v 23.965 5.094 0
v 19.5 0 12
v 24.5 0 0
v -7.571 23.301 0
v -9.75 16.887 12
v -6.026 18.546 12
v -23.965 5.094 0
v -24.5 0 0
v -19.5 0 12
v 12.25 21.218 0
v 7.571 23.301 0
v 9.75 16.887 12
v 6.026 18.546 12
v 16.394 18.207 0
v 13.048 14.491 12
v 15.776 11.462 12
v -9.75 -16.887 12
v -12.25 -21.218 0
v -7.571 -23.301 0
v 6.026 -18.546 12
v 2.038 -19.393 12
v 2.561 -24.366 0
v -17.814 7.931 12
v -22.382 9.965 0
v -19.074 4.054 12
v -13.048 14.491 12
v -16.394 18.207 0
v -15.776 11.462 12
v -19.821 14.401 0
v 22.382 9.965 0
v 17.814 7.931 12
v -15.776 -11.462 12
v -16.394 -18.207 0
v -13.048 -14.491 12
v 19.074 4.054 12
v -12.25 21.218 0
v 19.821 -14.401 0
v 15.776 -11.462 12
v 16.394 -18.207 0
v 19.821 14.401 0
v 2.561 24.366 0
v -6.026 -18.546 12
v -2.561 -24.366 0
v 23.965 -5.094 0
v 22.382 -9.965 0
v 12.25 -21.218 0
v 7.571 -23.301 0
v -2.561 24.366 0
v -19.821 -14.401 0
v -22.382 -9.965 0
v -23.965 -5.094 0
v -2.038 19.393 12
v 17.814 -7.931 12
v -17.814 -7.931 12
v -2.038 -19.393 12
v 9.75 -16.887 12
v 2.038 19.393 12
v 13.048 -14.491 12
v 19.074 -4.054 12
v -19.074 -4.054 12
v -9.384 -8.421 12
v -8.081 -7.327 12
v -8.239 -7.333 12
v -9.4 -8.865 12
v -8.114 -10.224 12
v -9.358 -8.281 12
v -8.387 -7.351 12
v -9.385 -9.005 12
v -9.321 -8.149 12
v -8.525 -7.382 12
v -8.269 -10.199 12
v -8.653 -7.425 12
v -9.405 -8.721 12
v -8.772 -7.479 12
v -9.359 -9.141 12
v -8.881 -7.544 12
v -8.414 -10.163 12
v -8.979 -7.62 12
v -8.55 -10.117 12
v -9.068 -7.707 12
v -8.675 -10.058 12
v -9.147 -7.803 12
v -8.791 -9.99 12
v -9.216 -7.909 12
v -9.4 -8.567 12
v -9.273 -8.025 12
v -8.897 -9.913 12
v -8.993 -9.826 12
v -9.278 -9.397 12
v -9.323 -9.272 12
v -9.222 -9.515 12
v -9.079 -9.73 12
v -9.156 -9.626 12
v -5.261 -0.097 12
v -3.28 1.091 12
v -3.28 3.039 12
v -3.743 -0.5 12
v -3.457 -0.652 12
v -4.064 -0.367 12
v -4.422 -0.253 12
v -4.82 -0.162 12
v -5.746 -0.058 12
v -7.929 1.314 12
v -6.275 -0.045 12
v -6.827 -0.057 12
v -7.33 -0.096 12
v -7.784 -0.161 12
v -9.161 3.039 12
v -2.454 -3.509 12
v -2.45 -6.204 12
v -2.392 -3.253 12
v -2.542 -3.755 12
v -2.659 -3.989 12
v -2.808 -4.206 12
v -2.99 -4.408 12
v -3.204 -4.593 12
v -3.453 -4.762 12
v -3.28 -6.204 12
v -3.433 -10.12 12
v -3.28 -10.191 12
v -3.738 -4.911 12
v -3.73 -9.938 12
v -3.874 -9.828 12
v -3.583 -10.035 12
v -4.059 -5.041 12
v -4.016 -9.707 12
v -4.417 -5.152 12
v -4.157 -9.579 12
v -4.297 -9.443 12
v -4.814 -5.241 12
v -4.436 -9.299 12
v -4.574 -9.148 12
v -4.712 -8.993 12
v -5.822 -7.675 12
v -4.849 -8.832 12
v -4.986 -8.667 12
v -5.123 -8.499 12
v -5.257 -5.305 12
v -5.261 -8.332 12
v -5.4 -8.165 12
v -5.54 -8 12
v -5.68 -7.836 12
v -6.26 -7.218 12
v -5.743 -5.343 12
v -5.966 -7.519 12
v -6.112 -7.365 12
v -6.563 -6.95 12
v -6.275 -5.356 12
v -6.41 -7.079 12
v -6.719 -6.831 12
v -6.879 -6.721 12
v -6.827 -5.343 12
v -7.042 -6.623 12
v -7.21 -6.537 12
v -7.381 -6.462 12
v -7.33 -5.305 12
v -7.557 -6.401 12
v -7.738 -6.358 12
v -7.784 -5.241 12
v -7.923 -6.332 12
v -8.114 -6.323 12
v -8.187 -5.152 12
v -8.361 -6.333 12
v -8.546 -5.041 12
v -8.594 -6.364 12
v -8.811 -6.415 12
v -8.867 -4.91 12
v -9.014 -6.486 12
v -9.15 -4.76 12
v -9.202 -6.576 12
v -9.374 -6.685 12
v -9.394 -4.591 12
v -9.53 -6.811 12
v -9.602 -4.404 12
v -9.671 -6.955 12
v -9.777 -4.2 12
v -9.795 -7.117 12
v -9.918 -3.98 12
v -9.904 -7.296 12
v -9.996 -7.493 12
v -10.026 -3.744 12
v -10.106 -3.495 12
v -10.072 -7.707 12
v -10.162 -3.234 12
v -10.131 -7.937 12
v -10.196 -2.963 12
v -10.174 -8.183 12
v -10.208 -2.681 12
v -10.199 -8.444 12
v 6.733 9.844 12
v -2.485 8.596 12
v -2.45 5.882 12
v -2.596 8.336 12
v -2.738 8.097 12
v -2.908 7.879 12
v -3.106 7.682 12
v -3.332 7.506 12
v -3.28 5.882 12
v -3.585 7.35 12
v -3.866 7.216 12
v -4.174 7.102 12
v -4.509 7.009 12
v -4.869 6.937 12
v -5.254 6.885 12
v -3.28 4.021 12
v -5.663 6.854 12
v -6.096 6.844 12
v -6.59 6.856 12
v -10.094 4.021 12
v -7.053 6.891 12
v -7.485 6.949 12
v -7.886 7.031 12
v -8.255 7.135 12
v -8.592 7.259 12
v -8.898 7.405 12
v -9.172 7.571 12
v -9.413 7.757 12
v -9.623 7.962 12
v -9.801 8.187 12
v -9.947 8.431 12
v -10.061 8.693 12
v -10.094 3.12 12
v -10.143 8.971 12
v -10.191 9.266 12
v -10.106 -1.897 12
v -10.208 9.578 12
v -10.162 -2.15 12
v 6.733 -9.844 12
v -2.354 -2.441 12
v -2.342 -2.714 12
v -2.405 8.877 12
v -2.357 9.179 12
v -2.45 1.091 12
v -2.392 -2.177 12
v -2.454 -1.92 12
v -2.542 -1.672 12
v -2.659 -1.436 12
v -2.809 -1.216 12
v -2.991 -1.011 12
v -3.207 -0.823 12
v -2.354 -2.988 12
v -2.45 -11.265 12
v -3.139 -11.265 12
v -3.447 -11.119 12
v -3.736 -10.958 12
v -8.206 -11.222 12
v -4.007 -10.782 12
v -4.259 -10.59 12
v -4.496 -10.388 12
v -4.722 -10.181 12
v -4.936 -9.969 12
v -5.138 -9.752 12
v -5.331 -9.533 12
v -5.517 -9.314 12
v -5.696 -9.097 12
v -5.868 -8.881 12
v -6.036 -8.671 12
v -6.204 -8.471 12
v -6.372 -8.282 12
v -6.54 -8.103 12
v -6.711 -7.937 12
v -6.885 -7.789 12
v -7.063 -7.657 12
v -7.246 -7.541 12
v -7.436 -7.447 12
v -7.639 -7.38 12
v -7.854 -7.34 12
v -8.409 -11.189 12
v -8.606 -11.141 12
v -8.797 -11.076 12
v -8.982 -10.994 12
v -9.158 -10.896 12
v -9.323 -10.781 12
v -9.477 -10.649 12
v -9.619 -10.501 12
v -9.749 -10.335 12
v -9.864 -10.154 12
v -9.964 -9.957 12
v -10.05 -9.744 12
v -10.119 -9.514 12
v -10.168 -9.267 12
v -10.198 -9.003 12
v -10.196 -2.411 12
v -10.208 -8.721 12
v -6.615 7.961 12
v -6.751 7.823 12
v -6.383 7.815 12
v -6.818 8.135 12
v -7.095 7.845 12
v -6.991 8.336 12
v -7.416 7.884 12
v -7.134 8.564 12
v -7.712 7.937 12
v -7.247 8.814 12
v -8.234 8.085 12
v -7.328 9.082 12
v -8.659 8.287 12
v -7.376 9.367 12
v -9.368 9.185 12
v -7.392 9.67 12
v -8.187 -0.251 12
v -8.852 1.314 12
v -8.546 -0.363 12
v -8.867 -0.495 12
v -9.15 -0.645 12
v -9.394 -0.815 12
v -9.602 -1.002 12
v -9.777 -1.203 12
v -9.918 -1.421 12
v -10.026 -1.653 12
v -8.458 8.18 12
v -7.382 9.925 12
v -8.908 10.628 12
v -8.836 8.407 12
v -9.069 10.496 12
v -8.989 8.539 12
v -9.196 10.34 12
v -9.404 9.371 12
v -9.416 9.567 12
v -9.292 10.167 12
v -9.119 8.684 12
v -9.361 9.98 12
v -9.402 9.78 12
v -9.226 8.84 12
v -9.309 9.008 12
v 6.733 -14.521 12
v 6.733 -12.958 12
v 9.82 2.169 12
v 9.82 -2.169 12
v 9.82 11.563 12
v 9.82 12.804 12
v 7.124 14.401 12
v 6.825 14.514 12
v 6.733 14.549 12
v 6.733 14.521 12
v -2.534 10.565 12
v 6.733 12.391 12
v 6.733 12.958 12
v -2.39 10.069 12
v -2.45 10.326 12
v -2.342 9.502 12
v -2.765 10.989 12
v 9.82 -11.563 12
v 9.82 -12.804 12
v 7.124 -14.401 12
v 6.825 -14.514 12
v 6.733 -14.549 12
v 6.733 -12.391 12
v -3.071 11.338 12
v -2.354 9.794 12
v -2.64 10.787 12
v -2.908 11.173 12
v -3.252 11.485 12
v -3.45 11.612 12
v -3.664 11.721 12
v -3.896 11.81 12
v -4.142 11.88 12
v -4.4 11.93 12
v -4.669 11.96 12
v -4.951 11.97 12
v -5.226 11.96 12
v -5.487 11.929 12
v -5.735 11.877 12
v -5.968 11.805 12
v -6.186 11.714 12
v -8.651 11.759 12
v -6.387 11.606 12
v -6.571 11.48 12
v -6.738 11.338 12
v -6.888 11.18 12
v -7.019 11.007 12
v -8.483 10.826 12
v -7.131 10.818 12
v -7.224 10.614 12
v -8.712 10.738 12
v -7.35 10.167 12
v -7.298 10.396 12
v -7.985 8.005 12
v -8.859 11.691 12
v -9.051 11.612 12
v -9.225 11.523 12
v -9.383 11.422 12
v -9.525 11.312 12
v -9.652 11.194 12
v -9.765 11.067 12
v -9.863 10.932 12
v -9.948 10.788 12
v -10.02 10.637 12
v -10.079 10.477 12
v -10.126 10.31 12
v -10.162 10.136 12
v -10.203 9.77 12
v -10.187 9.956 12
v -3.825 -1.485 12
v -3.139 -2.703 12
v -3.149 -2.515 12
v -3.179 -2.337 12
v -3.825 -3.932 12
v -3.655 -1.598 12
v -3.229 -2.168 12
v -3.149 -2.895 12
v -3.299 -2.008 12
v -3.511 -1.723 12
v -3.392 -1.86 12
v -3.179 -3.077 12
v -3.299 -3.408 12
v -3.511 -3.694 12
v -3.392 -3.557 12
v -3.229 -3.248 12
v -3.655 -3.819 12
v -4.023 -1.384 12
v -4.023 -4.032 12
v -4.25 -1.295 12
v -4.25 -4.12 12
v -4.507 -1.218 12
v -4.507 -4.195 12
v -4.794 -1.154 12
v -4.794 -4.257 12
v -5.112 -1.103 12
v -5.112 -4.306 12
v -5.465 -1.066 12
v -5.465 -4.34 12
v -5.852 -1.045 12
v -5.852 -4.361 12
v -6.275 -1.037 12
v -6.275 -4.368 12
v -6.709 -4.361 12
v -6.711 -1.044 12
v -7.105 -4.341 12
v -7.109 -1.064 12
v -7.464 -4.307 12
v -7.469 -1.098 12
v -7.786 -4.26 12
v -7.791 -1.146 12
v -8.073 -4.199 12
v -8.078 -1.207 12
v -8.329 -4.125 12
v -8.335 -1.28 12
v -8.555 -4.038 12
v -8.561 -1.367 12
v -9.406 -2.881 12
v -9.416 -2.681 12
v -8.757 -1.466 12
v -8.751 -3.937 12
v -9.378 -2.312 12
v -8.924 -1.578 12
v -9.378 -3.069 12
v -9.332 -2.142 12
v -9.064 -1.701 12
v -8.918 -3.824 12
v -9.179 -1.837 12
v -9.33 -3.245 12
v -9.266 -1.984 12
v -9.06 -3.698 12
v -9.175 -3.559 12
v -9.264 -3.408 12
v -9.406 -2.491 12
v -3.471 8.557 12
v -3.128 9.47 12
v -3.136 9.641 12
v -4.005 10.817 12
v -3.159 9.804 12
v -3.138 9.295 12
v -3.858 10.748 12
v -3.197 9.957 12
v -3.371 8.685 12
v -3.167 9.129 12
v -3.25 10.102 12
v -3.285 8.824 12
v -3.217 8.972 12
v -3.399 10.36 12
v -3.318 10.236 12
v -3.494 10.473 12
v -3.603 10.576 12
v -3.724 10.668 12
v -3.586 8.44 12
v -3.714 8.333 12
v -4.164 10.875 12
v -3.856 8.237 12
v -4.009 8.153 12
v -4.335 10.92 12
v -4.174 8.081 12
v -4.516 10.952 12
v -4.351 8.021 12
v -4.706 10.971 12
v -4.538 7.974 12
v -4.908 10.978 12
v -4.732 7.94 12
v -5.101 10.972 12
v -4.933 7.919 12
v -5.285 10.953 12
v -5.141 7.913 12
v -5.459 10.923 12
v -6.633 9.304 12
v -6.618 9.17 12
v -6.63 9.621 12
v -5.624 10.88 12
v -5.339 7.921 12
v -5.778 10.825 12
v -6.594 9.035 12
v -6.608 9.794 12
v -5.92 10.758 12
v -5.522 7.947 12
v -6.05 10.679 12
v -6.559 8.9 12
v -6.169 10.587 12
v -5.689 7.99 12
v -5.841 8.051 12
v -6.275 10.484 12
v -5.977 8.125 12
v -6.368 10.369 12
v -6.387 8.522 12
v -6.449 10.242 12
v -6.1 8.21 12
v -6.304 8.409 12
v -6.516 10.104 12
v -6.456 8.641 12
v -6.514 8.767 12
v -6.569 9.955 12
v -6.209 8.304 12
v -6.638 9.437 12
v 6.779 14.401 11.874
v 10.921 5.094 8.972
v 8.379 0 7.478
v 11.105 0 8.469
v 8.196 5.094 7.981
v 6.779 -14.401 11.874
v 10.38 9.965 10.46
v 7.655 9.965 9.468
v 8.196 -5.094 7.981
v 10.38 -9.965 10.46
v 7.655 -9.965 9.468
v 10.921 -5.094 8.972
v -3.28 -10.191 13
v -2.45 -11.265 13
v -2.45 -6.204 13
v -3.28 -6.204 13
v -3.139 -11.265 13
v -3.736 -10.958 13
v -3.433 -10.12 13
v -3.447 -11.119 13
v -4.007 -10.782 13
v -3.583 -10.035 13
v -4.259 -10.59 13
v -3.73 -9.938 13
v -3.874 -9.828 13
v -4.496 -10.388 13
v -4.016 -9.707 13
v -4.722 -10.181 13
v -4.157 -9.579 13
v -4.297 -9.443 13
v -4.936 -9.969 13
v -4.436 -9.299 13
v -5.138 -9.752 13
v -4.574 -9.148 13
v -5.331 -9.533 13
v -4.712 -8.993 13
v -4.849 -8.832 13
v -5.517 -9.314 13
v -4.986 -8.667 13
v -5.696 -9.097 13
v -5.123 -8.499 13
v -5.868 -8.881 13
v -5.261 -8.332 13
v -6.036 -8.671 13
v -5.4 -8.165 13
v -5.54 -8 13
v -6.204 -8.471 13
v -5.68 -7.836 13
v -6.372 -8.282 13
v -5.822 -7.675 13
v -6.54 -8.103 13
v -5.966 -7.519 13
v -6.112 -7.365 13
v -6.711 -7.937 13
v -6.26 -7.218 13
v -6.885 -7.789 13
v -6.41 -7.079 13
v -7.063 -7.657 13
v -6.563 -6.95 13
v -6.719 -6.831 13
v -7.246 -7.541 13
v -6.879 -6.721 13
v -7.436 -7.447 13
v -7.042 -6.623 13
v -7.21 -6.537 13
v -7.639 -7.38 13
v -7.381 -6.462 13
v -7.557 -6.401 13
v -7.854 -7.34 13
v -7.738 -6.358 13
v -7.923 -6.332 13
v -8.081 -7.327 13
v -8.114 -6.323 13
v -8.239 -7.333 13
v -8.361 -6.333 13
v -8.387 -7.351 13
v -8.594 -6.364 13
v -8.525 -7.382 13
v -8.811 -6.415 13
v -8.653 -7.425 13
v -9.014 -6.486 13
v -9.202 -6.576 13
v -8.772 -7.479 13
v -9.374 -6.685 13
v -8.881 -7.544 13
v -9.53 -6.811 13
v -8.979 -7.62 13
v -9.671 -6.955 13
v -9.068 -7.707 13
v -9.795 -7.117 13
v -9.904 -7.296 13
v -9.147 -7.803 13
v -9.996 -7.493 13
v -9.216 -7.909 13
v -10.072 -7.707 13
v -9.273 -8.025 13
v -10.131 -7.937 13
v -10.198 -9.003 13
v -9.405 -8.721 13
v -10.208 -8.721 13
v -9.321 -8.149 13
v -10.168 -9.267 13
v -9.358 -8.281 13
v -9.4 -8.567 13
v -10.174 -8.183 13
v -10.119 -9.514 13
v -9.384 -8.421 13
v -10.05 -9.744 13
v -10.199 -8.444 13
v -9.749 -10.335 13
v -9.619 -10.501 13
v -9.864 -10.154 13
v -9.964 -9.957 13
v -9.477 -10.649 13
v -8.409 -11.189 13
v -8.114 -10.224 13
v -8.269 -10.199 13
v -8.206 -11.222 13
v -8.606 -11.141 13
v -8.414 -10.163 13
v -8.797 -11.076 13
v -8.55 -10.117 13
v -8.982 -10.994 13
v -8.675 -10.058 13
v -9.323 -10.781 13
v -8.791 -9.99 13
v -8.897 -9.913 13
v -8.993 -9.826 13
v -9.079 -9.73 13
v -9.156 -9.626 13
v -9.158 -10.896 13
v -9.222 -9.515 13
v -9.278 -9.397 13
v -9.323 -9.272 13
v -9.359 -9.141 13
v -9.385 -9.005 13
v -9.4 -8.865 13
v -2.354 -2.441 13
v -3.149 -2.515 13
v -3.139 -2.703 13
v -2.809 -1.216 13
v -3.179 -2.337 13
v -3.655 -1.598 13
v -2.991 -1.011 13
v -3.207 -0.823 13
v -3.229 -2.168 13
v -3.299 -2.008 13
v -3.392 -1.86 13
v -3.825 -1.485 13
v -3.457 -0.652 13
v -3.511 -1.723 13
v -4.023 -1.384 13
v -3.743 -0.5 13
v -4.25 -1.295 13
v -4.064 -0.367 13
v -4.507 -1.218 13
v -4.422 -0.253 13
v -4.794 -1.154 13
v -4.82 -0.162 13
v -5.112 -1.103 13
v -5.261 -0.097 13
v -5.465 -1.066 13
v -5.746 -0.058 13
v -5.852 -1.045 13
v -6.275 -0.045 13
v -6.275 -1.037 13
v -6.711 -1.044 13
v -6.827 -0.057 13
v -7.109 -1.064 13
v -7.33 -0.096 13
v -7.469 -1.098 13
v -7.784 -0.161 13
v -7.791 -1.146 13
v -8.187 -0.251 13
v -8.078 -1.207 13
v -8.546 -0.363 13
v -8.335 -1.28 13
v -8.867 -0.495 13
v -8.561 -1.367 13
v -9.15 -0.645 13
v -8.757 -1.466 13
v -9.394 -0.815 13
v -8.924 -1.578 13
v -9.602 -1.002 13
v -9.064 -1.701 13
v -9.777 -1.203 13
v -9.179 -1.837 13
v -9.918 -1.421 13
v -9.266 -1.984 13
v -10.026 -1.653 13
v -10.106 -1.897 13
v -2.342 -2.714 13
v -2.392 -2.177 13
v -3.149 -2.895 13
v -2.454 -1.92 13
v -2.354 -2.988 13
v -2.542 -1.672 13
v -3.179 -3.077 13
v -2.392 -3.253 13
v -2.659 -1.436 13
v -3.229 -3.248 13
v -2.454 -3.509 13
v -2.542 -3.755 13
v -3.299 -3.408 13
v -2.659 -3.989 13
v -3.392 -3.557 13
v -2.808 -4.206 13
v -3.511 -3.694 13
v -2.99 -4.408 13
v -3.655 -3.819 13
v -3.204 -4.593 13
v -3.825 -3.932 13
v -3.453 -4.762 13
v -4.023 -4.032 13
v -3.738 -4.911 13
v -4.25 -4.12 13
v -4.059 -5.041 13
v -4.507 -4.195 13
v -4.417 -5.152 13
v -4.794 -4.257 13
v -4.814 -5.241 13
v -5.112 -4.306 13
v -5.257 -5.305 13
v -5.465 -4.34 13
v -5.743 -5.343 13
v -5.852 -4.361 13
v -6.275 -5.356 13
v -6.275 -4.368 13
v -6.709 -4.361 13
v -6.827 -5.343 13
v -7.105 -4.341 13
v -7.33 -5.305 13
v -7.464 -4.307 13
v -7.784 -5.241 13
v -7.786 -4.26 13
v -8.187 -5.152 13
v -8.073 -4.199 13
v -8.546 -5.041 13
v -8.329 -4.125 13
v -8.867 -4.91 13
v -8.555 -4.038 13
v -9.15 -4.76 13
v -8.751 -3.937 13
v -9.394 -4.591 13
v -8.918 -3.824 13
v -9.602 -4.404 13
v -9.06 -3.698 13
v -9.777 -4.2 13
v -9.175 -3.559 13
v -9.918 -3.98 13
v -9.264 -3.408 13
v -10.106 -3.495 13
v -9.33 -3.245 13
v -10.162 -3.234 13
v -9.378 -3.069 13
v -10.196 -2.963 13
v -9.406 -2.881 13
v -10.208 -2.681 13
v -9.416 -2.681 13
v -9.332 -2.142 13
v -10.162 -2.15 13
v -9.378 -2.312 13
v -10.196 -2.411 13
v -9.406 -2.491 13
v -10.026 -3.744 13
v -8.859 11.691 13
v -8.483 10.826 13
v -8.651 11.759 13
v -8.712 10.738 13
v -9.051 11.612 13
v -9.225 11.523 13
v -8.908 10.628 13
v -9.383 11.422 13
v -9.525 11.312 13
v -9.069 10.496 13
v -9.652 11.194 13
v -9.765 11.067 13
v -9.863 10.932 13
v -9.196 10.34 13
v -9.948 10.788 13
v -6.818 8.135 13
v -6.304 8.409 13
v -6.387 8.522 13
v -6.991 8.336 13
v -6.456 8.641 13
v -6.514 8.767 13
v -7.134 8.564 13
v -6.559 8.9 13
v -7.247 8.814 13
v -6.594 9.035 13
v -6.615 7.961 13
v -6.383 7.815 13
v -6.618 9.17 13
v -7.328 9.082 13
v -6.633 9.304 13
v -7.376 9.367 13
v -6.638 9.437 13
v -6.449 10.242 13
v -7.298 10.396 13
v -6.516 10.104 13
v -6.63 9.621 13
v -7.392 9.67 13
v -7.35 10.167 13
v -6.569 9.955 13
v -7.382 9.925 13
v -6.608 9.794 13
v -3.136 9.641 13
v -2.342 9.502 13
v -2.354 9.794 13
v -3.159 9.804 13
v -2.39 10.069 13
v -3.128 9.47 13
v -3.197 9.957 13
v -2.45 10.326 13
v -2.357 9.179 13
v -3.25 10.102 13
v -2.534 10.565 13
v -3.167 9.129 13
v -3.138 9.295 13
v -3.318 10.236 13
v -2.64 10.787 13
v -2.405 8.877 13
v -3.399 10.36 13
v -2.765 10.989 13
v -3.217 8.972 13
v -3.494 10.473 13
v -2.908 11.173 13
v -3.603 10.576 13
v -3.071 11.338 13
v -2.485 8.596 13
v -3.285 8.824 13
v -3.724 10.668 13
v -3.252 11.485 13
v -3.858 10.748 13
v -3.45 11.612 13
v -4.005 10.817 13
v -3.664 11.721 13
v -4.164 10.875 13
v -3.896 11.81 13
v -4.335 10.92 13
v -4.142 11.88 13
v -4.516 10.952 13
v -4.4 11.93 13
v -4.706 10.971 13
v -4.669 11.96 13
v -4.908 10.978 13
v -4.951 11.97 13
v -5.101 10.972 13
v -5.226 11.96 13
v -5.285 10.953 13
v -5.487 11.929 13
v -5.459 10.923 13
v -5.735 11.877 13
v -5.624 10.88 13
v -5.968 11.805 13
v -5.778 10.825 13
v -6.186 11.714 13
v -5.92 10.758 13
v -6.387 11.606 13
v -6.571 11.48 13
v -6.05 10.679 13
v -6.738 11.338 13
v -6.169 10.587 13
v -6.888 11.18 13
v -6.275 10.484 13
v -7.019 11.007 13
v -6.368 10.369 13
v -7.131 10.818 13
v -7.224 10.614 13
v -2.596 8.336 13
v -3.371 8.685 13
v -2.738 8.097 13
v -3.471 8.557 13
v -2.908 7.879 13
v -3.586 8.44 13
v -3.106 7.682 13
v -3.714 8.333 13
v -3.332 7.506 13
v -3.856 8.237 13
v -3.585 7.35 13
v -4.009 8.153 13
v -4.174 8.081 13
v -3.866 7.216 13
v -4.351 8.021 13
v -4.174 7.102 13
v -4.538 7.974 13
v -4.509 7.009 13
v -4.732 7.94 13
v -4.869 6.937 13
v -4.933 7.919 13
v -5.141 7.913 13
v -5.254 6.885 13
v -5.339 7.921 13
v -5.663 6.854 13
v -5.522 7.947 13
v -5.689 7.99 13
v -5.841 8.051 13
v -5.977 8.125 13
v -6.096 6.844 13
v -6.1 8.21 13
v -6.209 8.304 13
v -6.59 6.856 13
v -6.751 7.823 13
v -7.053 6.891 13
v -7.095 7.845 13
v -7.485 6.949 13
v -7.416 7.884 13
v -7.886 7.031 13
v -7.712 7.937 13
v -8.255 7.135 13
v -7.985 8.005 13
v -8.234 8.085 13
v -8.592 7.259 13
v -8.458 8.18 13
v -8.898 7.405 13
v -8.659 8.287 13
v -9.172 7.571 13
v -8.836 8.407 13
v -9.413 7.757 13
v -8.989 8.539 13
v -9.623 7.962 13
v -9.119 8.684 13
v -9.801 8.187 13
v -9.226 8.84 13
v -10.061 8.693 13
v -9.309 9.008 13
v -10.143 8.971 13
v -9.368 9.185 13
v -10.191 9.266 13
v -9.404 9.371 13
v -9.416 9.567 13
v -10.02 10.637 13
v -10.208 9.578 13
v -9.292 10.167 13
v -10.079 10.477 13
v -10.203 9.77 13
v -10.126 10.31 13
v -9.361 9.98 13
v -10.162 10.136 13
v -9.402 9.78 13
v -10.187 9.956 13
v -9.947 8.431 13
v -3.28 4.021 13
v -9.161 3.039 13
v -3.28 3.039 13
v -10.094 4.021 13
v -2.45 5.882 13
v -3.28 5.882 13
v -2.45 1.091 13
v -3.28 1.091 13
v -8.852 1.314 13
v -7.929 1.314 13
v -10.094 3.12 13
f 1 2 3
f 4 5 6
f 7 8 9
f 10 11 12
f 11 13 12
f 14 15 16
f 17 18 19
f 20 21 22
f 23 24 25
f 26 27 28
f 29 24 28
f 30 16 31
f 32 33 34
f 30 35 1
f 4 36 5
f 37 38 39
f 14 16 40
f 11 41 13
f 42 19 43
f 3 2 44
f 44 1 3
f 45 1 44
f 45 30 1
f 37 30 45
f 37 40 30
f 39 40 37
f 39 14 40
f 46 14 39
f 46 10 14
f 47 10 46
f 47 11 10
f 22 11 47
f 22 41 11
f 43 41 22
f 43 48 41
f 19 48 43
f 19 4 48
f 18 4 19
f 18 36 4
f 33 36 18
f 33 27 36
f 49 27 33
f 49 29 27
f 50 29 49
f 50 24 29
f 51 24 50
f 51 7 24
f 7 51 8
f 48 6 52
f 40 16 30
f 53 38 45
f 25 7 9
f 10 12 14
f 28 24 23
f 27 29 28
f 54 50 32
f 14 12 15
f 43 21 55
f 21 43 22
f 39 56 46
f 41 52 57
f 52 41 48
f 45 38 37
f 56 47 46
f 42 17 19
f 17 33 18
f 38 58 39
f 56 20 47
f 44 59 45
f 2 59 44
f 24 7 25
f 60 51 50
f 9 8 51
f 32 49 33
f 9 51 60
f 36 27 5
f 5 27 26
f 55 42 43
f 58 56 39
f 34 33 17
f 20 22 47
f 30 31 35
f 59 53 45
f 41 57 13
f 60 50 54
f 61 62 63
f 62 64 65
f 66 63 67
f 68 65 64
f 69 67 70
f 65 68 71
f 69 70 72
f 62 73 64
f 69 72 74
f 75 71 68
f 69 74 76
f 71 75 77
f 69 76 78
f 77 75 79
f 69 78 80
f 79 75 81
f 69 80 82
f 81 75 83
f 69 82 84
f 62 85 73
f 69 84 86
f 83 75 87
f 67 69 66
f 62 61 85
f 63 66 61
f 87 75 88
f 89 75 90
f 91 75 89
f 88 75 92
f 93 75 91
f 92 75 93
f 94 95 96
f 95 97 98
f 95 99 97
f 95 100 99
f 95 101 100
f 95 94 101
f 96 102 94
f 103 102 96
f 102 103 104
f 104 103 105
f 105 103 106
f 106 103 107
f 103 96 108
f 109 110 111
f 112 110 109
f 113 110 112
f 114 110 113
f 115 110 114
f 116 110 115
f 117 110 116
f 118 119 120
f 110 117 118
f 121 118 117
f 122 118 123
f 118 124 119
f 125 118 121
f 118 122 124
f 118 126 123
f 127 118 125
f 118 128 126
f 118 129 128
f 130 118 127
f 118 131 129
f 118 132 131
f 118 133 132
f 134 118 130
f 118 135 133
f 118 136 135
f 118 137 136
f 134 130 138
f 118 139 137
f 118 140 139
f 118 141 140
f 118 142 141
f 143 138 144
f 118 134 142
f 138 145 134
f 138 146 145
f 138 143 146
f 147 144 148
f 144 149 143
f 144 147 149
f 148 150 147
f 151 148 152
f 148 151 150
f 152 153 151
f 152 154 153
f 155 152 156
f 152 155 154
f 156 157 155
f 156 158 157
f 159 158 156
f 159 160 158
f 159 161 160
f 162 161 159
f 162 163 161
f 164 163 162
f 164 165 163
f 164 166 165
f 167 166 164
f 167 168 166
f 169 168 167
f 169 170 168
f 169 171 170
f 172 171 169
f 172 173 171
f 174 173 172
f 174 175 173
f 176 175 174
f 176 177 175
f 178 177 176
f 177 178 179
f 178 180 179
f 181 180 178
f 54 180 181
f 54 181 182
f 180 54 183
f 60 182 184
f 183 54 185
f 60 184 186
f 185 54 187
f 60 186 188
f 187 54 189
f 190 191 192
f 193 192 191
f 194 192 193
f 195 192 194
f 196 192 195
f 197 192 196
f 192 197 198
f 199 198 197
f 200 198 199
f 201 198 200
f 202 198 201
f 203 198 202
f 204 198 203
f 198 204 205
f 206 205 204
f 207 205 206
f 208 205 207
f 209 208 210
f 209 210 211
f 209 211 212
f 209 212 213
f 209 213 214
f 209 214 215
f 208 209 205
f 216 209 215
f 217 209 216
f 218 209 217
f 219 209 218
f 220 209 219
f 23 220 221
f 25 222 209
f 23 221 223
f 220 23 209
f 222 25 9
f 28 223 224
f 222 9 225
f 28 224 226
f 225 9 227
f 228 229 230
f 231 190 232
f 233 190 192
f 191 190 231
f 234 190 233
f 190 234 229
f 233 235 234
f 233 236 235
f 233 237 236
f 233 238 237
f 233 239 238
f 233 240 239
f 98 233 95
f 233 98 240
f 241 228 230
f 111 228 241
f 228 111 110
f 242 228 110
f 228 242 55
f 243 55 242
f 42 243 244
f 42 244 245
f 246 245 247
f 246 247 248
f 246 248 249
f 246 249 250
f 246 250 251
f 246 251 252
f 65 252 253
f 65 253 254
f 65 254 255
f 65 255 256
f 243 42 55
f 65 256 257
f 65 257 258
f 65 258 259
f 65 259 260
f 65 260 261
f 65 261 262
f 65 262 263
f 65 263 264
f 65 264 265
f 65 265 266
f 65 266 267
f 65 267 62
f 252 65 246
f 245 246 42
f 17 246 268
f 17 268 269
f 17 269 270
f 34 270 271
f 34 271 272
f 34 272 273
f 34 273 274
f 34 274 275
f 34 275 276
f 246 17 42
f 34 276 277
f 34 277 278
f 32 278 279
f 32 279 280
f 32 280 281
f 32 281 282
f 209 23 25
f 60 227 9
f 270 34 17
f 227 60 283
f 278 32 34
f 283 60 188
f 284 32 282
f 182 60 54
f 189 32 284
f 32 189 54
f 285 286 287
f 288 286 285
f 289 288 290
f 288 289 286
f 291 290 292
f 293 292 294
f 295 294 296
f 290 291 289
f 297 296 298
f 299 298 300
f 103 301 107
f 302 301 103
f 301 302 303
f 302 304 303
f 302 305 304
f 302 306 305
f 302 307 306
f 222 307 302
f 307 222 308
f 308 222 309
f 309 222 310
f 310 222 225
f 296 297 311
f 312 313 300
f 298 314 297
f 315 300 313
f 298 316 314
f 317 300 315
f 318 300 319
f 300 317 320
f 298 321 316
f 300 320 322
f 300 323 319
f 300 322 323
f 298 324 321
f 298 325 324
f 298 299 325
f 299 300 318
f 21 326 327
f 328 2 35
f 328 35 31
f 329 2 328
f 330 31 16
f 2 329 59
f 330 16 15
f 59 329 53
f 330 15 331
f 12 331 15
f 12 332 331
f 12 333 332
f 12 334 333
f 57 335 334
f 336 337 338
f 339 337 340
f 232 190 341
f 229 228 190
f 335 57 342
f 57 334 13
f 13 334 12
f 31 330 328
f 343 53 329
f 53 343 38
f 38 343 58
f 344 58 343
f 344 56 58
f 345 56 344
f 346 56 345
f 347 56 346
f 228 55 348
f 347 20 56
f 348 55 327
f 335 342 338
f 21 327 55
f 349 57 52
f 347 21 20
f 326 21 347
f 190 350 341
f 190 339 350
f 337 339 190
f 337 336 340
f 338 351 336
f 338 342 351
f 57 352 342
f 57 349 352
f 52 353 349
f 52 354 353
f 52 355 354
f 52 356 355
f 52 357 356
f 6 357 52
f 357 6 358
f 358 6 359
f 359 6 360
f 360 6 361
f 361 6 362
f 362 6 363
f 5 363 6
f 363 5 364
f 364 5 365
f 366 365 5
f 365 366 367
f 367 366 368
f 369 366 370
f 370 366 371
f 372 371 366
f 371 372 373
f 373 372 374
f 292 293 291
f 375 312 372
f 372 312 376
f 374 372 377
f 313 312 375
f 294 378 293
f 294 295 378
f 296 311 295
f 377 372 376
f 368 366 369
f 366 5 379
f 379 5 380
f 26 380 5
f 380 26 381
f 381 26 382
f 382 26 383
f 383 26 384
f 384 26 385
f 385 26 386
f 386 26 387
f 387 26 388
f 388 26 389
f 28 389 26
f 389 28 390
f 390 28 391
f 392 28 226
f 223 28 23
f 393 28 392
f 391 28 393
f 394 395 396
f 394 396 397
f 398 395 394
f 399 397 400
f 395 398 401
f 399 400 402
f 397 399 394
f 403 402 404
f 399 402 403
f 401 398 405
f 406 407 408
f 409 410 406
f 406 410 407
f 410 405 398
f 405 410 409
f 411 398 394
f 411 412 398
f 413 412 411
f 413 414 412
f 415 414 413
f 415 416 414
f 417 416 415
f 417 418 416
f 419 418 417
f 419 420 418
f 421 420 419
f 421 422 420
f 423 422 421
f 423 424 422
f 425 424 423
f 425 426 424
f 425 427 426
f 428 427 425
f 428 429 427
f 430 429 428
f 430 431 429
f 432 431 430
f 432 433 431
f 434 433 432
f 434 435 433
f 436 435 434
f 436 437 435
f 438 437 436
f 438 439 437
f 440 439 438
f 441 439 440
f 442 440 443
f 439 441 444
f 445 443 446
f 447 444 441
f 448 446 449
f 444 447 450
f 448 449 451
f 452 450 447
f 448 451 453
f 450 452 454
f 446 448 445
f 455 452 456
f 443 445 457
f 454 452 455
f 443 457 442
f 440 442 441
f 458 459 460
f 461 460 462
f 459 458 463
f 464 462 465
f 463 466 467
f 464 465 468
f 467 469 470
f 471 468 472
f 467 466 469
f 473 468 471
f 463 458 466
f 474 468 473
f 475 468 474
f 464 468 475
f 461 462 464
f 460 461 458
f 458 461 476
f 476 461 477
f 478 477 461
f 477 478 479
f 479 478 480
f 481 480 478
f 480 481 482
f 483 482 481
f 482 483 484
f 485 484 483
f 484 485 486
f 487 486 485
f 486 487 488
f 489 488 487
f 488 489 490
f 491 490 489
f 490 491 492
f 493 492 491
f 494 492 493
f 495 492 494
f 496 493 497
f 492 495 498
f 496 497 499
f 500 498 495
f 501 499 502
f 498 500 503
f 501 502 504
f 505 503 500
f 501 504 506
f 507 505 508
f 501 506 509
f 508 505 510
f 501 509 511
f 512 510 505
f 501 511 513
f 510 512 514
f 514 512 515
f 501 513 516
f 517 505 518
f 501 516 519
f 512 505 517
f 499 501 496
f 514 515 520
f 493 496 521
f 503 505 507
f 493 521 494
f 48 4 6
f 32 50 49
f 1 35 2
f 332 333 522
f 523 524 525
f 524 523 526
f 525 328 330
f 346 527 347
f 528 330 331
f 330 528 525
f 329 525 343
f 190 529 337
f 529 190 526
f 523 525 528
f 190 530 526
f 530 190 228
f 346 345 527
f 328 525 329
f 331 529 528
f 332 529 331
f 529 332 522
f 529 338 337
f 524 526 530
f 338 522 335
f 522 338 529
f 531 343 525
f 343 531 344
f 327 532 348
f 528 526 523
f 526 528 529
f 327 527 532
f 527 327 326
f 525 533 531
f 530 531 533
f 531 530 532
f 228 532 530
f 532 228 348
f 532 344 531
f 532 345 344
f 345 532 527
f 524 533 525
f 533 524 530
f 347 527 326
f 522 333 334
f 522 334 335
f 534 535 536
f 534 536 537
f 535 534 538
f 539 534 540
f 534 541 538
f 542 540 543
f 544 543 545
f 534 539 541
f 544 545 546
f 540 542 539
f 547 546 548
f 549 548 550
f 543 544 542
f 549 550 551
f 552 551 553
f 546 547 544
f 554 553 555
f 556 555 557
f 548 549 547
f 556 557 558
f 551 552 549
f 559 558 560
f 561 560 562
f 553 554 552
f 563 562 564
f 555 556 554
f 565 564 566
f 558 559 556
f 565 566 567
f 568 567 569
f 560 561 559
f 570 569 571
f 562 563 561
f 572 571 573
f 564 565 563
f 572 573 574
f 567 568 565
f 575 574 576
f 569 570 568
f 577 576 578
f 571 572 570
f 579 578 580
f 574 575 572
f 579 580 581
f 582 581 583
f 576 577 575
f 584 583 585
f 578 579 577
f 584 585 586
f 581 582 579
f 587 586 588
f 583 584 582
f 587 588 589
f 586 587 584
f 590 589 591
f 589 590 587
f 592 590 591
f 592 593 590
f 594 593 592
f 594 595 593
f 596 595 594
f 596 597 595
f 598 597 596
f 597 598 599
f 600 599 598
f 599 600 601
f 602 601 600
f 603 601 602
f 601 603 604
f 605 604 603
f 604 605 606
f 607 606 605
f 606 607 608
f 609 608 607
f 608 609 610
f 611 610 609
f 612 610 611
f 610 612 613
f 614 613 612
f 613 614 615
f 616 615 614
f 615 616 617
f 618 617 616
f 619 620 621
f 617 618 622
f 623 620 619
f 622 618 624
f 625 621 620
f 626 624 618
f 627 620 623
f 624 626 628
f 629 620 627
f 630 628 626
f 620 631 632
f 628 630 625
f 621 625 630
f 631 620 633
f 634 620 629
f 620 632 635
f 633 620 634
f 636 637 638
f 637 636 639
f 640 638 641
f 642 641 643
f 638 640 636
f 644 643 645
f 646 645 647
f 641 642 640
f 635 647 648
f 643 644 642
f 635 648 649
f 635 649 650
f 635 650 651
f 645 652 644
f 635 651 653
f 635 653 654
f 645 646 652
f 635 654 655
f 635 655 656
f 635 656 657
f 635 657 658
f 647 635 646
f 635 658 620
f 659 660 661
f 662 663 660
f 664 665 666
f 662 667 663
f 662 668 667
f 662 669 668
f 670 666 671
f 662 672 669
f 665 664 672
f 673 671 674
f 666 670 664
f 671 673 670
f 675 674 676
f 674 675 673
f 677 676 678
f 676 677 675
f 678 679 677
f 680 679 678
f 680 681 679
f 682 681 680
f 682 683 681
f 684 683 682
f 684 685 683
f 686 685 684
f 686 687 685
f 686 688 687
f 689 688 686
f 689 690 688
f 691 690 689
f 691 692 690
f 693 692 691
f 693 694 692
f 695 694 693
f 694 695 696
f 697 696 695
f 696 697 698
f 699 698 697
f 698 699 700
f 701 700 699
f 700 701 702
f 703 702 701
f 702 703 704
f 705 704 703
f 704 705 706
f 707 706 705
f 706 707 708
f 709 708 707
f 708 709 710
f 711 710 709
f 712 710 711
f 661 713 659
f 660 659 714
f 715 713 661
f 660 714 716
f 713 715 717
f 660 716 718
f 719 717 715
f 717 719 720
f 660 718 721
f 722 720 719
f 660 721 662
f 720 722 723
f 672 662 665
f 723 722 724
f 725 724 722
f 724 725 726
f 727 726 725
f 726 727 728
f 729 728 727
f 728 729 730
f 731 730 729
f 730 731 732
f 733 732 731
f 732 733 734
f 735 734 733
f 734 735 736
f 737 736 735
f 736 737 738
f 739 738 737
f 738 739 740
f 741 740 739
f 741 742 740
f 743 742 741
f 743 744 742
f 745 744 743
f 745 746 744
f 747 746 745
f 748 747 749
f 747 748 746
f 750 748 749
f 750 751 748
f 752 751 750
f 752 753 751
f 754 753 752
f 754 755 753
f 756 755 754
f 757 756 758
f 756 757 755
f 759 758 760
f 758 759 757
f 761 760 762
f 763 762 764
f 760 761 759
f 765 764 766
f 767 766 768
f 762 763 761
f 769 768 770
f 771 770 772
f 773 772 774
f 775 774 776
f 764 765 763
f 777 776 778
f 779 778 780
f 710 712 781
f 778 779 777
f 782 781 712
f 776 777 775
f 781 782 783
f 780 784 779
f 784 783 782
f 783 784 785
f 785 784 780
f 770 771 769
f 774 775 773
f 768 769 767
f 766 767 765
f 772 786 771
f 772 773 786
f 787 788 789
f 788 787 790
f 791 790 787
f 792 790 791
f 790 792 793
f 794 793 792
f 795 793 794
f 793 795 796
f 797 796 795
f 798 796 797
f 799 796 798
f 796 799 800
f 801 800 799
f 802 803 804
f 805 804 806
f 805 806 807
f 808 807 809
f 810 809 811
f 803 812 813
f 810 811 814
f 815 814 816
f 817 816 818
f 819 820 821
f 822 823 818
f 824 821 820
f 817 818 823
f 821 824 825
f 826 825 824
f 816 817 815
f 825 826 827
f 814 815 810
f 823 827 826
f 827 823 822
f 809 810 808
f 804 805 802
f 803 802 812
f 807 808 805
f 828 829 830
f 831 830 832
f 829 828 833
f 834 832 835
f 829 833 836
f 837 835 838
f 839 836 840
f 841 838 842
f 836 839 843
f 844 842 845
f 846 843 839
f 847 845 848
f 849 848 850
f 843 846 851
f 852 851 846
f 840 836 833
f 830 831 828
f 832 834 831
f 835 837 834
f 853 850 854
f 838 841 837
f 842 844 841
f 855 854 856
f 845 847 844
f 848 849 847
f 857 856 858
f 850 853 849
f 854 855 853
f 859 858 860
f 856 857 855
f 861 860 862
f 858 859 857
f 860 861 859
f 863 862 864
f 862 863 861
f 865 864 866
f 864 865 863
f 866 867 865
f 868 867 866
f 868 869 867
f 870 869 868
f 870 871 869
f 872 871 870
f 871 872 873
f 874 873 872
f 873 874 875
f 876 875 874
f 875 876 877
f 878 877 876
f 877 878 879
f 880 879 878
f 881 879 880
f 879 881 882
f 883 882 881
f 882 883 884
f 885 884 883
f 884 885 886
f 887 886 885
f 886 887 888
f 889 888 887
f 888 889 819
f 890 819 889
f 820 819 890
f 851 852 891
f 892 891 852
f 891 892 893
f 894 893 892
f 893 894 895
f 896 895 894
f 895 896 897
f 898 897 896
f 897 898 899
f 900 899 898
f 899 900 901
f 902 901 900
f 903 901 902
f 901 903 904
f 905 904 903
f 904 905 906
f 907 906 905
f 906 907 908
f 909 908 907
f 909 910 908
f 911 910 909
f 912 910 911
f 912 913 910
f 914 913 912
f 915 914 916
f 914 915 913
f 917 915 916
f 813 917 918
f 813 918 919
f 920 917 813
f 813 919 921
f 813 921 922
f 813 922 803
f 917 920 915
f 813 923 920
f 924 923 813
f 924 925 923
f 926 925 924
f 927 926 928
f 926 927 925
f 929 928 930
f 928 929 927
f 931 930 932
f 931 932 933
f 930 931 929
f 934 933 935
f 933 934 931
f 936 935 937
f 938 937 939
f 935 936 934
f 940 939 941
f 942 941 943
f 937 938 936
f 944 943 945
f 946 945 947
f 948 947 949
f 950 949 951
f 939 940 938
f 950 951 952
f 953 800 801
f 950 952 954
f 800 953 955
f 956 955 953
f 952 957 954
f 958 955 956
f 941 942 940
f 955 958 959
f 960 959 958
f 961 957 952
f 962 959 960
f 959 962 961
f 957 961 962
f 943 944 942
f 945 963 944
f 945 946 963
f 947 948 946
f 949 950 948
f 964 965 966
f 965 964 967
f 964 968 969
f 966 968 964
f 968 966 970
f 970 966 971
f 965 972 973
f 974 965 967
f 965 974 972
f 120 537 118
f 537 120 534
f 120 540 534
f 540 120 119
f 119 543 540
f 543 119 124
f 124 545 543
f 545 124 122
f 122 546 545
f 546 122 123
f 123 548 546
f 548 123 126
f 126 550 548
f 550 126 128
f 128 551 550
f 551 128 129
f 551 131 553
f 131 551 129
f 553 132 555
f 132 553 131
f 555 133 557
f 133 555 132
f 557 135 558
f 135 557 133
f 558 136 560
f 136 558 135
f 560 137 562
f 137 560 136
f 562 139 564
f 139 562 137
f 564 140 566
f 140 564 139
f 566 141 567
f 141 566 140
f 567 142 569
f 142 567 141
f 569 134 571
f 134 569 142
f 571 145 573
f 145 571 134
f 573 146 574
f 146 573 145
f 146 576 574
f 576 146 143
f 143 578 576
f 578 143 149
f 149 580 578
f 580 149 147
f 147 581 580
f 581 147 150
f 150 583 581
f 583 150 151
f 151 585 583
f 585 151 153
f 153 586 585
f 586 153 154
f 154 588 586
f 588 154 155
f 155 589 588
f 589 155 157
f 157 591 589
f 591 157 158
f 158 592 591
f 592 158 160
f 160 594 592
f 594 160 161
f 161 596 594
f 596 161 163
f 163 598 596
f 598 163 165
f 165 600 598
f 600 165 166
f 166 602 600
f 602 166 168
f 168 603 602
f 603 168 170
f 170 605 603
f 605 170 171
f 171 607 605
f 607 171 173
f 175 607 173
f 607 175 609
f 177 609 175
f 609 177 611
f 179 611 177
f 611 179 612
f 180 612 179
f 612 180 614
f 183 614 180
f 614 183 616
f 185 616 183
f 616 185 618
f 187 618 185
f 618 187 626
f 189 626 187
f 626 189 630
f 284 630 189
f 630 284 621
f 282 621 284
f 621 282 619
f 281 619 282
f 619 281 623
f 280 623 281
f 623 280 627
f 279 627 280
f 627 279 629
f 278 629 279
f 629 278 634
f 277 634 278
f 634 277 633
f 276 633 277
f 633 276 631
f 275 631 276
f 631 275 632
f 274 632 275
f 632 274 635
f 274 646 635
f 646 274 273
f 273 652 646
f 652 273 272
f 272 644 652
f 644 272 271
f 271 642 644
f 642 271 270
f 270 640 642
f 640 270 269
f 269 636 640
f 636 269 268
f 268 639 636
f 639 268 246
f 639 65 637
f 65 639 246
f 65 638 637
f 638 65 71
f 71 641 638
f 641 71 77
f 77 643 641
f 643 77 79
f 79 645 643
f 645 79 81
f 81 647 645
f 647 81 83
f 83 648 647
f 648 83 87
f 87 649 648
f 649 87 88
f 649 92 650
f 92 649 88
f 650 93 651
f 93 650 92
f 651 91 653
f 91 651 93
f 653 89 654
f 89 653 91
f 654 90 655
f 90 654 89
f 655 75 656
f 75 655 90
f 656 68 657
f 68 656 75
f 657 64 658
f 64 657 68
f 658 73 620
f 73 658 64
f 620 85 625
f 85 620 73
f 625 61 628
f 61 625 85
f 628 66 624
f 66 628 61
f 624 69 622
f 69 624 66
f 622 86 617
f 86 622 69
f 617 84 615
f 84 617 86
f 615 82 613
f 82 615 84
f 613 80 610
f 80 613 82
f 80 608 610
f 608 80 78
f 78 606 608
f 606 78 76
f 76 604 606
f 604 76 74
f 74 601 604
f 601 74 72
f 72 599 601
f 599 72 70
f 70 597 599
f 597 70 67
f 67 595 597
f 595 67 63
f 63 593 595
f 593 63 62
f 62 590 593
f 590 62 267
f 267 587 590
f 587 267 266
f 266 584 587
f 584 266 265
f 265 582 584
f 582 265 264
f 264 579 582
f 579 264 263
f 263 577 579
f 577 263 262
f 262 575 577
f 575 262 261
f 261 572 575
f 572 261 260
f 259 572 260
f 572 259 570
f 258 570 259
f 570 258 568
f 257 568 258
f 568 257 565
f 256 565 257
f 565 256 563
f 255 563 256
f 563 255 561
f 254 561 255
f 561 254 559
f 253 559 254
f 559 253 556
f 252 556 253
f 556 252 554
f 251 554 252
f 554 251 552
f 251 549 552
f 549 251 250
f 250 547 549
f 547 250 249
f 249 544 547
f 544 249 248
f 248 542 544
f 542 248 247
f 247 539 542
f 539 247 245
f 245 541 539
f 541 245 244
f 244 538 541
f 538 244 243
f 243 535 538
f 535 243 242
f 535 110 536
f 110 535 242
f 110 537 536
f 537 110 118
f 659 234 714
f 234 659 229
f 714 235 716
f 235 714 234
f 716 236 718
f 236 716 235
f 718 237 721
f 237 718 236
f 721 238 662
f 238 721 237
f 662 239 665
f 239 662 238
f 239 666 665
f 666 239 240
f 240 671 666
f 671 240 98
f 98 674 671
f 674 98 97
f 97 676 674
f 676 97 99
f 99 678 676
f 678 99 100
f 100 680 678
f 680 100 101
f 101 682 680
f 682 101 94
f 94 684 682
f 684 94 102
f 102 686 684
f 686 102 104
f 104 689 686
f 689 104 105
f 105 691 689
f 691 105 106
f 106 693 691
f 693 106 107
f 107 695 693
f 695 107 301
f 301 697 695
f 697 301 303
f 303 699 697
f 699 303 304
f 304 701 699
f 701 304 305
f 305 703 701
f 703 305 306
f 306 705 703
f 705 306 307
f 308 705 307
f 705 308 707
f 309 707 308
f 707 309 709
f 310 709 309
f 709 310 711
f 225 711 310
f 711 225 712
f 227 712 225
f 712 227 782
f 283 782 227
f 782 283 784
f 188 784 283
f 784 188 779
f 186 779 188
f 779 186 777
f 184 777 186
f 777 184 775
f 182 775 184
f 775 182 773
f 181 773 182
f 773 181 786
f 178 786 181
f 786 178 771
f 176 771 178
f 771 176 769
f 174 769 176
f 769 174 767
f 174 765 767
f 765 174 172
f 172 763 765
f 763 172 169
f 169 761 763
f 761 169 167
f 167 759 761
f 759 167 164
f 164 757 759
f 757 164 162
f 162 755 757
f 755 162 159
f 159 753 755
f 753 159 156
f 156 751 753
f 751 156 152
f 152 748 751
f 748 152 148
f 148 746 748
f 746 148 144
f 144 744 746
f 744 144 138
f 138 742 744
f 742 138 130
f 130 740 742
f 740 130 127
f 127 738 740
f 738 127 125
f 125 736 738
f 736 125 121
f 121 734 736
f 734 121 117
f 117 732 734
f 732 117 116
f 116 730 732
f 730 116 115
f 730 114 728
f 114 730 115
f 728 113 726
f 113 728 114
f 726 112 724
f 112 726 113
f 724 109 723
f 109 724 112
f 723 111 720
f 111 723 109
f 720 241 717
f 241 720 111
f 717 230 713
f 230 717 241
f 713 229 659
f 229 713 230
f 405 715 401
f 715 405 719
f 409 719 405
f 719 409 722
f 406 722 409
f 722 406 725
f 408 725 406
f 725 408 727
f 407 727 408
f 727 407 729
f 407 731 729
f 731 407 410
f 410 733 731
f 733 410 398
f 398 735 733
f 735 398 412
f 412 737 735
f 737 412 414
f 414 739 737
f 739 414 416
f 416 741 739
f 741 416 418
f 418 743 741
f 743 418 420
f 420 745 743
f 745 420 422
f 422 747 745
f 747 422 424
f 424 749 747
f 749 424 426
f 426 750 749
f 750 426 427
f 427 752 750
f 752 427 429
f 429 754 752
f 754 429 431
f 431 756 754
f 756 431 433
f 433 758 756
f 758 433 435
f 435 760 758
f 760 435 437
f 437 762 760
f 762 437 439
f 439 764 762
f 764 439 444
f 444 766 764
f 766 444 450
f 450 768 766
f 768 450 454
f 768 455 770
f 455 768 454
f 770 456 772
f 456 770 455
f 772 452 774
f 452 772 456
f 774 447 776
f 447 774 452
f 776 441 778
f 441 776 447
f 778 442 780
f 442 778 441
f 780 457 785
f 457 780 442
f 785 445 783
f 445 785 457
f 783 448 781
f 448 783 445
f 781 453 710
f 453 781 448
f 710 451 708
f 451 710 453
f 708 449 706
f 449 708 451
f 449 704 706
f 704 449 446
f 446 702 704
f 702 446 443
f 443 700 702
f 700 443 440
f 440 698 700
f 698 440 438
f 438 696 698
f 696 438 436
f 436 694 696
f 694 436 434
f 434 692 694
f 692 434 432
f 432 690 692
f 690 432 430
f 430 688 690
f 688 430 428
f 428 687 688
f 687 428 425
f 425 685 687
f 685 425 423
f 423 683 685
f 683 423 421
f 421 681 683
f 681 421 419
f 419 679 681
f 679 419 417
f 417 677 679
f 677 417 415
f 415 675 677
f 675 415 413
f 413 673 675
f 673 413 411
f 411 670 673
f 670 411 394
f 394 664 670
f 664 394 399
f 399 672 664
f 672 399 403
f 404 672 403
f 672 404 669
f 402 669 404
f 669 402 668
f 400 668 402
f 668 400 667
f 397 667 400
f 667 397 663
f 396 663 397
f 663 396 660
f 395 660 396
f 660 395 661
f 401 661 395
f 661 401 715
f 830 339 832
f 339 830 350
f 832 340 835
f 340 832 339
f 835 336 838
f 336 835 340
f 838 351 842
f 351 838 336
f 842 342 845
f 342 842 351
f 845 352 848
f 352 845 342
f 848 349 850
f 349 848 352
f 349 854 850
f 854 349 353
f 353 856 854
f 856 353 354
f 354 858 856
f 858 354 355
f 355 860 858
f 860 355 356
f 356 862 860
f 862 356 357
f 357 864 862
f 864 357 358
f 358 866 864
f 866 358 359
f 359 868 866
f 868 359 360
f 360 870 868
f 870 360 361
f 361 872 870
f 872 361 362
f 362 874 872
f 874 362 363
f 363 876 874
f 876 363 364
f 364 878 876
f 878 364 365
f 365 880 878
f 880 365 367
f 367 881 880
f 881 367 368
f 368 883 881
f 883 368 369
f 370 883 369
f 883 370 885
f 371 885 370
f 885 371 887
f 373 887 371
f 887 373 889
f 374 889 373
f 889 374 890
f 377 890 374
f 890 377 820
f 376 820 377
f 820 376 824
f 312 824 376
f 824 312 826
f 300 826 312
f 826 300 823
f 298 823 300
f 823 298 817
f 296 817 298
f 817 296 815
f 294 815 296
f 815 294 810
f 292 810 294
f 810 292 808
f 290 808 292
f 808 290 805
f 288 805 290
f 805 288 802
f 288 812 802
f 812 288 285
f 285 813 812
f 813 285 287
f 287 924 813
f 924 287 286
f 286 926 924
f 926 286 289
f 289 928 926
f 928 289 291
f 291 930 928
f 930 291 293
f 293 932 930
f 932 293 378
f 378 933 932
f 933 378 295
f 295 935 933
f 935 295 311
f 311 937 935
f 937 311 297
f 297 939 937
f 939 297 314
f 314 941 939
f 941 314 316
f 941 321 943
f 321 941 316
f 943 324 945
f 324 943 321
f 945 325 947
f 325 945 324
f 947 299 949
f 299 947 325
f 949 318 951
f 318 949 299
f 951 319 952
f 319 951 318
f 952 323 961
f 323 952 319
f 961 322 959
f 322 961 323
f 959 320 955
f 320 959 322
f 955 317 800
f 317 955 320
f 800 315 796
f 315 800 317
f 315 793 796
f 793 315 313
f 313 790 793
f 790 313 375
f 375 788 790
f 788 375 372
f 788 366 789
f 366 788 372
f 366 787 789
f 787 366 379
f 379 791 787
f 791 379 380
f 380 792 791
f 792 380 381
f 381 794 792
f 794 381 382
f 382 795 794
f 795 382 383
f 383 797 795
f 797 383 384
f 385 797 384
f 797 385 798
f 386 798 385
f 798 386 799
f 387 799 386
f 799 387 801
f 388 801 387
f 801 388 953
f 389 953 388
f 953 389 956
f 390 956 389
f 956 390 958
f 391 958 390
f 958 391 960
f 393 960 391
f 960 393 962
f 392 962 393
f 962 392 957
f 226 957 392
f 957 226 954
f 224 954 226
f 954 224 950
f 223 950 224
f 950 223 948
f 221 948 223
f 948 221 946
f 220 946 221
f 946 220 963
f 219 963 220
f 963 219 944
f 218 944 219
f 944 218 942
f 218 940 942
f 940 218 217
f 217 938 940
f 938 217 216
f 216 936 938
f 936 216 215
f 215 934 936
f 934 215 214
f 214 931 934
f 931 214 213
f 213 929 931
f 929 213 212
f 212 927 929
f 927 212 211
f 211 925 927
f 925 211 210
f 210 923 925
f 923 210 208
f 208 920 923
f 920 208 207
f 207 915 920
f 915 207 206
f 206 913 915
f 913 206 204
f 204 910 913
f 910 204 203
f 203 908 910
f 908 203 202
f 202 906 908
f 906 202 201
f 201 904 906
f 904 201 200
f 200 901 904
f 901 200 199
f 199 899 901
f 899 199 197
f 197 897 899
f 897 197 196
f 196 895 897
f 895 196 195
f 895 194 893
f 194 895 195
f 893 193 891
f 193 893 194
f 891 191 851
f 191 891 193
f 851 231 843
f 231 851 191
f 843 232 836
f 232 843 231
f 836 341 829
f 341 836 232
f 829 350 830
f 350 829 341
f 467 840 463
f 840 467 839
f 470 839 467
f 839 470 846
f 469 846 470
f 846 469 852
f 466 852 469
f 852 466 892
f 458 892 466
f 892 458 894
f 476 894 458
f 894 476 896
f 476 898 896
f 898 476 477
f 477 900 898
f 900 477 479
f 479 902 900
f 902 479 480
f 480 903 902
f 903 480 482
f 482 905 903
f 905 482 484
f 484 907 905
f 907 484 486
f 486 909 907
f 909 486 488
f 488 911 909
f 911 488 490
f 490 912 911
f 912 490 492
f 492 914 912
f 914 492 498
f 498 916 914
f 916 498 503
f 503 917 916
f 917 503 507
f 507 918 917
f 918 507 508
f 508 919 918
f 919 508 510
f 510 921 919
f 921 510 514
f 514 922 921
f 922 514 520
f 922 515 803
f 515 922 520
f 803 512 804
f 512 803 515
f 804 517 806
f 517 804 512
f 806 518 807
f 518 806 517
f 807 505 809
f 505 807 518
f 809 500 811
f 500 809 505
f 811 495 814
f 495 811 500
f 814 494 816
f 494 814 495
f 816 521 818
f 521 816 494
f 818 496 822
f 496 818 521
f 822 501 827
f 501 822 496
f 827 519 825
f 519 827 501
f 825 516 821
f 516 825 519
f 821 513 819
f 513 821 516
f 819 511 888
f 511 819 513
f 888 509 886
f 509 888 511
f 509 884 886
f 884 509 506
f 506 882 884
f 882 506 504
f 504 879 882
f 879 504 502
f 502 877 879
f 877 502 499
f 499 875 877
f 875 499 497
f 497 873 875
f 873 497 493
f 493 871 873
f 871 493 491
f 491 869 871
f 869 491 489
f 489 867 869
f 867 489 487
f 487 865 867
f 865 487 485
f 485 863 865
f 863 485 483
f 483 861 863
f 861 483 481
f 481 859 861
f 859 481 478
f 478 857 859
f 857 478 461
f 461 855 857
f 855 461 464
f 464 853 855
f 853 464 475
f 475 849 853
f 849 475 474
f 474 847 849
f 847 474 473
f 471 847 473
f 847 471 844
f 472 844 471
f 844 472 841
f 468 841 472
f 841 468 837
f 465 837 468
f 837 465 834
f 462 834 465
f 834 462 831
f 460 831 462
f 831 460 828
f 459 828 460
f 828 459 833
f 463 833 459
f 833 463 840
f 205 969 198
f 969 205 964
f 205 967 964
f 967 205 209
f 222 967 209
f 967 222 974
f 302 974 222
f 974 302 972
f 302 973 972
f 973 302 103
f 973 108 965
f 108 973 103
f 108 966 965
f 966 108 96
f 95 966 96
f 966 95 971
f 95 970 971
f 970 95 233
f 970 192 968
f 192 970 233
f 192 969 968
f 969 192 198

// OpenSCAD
// Parametric Coin Stand
// www.thingiverse.com/gkstmr
// Goksenin Tumer
// Stand Height in mm
Stand_Height=12; 
// Coin diameter in mm
Coin_Diameter=49;
// Coin thickness in mm 
Coin_Thickness=2.8;
// Stand Text 
Coin_Label="2016";
// Font Size
FontS=08;
coinr=Coin_Diameter/2;
//Type == 0  Rectangular: Type == 1 Conical
type=1;               
if (type==0)
{
difference()
    {
minkowski(){cube ([coinr*1.2-4,coinr*2-4,Stand_Height]); cylinder (r=2, h=1);}; translate ([coinr/2,coinr,Stand_Height+coinr-6])rotate ([0,70,0])  cylinder (Coin_Thickness+0.1,coinr,coinr,true) ;
}
union () {linear_extrude(Stand_Height+2) rotate ([0,0,90]) translate ([coinr, -coinr/2, Stand_Height])  text (Coin_Label, halign = "center", size=FontS);}
};
//translate ([coinr,coinr*4,0])
if (type!=0)
{
difference() { cylinder (Stand_Height,coinr,coinr-5,false);
    translate ([0,0,Stand_Height+coinr-6])rotate ([0,70,0])
    cylinder (Coin_Thickness+0.1,coinr,coinr,false);
    ;}
  
   
union () {linear_extrude(Stand_Height+1) rotate ([0,0,90]) translate ([coinr/100, coinr/10, Stand_Height])  text (Coin_Label, halign = "center", size=FontS);}
 };
